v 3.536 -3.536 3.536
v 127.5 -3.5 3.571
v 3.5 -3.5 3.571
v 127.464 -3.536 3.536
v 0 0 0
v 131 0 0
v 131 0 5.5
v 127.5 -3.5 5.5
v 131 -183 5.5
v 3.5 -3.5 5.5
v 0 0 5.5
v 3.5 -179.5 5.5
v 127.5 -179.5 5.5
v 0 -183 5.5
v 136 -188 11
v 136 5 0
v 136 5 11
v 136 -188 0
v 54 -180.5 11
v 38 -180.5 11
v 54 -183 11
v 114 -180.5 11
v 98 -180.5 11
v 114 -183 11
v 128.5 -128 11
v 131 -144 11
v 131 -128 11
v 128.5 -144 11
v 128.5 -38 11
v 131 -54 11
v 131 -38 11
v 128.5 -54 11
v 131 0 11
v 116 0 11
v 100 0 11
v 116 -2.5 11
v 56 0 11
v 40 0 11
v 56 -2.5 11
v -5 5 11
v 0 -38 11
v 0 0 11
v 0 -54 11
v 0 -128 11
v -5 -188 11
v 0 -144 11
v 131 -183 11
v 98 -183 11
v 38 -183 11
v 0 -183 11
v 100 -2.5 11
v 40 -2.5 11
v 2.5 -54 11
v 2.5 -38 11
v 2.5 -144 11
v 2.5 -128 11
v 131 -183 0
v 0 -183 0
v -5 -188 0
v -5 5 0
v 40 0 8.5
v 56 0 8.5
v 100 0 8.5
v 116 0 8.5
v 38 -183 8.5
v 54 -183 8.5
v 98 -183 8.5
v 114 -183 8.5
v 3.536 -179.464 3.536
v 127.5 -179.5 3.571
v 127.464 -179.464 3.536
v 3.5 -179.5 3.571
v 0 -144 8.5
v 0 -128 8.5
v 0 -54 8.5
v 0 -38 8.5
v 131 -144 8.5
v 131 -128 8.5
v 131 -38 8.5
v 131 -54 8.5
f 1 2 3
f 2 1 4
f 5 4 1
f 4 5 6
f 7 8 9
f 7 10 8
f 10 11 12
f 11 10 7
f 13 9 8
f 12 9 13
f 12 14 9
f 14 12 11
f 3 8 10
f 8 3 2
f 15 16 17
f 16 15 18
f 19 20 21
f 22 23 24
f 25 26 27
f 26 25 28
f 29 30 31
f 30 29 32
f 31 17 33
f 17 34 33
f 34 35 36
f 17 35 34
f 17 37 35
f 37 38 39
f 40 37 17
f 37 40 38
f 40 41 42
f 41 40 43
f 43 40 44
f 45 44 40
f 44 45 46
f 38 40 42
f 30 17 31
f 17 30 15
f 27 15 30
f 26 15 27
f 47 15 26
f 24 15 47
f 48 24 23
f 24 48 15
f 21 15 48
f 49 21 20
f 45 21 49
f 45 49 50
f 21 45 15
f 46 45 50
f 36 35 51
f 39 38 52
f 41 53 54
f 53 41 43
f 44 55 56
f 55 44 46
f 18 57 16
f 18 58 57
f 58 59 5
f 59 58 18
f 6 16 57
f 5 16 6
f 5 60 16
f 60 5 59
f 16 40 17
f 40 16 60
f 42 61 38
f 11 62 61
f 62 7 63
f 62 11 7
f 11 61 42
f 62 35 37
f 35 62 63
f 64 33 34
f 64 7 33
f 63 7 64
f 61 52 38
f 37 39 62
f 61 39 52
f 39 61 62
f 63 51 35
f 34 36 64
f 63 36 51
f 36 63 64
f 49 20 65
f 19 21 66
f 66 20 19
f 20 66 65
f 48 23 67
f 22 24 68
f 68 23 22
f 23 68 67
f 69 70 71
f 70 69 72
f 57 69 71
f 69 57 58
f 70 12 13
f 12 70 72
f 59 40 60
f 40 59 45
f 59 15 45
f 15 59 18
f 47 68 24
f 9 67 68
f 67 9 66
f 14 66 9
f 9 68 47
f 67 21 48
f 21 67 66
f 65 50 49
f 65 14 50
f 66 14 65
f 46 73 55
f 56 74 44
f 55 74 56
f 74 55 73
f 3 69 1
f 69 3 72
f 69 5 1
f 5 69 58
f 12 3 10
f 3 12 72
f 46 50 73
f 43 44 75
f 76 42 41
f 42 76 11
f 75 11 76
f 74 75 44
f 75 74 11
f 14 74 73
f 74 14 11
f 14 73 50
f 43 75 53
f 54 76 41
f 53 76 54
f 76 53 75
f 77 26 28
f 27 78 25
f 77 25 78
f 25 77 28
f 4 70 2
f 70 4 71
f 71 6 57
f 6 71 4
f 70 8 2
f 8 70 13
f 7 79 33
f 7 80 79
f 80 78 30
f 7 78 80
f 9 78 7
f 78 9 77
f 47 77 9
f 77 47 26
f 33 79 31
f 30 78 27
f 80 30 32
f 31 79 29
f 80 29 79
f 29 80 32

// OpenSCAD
keyPlateHolder();

module keyPlateHolder() {
	bevelEdge(133);
	translate([40,1,0])	bevelClip();
	translate([100,1,0])	bevelClip();


	translate([-2,-183,0]) mirror([0,1,0]) {
		translate([40,1,0])	bevelClip();
		translate([100,1,0])	bevelClip();

		bevelEdge(135);
	
	}
	
	translate([0,-184,0]) {
		rotate([0,0,90]) {
			bevelEdge(186);
			translate([40,1,0])	bevelClip();
			translate([130,1,0])	bevelClip();


			translate([0,-131,0]) mirror([0,1,0]) {
				bevelEdge(186);
	  			translate([40,1,0])	bevelClip();
  				translate([130,1,0])	bevelClip();

			}

		}
	
	}
}

module bevelClip(){
	intersection() {
		translate([0,-5,0]) cube([16,20,11]);
		translate([0,0,7.5]) {
			color("blue")	bevel(16);
		}
	}
}

module bevelEdge(length) {
	union() {

		bevel(length);

		bevelEdgeOuterWall(length);

	}
}

module bevel(length) {
		difference() {
			union () {
			
				// Angled bottom lip and angled support
			difference () {
					color("red") {rotate([45,0,0])	cube([length, 5,5]);}
					translate([0,-2.5,5]) 	cube([length,5,5]);
				}	
				color("green") {
				translate([0,-3.5,3.5])	cube([length,5,2]);
	}
			}
			
			// cut off the outside edge of the angled support
			translate([0,1,1]) cube([length,3,5]);
		
		}
}

module bevelEdgeOuterWall(length) {
		translate([-3,0,0]) {		
			cube([length+6,5,11]);
	
		}
}
